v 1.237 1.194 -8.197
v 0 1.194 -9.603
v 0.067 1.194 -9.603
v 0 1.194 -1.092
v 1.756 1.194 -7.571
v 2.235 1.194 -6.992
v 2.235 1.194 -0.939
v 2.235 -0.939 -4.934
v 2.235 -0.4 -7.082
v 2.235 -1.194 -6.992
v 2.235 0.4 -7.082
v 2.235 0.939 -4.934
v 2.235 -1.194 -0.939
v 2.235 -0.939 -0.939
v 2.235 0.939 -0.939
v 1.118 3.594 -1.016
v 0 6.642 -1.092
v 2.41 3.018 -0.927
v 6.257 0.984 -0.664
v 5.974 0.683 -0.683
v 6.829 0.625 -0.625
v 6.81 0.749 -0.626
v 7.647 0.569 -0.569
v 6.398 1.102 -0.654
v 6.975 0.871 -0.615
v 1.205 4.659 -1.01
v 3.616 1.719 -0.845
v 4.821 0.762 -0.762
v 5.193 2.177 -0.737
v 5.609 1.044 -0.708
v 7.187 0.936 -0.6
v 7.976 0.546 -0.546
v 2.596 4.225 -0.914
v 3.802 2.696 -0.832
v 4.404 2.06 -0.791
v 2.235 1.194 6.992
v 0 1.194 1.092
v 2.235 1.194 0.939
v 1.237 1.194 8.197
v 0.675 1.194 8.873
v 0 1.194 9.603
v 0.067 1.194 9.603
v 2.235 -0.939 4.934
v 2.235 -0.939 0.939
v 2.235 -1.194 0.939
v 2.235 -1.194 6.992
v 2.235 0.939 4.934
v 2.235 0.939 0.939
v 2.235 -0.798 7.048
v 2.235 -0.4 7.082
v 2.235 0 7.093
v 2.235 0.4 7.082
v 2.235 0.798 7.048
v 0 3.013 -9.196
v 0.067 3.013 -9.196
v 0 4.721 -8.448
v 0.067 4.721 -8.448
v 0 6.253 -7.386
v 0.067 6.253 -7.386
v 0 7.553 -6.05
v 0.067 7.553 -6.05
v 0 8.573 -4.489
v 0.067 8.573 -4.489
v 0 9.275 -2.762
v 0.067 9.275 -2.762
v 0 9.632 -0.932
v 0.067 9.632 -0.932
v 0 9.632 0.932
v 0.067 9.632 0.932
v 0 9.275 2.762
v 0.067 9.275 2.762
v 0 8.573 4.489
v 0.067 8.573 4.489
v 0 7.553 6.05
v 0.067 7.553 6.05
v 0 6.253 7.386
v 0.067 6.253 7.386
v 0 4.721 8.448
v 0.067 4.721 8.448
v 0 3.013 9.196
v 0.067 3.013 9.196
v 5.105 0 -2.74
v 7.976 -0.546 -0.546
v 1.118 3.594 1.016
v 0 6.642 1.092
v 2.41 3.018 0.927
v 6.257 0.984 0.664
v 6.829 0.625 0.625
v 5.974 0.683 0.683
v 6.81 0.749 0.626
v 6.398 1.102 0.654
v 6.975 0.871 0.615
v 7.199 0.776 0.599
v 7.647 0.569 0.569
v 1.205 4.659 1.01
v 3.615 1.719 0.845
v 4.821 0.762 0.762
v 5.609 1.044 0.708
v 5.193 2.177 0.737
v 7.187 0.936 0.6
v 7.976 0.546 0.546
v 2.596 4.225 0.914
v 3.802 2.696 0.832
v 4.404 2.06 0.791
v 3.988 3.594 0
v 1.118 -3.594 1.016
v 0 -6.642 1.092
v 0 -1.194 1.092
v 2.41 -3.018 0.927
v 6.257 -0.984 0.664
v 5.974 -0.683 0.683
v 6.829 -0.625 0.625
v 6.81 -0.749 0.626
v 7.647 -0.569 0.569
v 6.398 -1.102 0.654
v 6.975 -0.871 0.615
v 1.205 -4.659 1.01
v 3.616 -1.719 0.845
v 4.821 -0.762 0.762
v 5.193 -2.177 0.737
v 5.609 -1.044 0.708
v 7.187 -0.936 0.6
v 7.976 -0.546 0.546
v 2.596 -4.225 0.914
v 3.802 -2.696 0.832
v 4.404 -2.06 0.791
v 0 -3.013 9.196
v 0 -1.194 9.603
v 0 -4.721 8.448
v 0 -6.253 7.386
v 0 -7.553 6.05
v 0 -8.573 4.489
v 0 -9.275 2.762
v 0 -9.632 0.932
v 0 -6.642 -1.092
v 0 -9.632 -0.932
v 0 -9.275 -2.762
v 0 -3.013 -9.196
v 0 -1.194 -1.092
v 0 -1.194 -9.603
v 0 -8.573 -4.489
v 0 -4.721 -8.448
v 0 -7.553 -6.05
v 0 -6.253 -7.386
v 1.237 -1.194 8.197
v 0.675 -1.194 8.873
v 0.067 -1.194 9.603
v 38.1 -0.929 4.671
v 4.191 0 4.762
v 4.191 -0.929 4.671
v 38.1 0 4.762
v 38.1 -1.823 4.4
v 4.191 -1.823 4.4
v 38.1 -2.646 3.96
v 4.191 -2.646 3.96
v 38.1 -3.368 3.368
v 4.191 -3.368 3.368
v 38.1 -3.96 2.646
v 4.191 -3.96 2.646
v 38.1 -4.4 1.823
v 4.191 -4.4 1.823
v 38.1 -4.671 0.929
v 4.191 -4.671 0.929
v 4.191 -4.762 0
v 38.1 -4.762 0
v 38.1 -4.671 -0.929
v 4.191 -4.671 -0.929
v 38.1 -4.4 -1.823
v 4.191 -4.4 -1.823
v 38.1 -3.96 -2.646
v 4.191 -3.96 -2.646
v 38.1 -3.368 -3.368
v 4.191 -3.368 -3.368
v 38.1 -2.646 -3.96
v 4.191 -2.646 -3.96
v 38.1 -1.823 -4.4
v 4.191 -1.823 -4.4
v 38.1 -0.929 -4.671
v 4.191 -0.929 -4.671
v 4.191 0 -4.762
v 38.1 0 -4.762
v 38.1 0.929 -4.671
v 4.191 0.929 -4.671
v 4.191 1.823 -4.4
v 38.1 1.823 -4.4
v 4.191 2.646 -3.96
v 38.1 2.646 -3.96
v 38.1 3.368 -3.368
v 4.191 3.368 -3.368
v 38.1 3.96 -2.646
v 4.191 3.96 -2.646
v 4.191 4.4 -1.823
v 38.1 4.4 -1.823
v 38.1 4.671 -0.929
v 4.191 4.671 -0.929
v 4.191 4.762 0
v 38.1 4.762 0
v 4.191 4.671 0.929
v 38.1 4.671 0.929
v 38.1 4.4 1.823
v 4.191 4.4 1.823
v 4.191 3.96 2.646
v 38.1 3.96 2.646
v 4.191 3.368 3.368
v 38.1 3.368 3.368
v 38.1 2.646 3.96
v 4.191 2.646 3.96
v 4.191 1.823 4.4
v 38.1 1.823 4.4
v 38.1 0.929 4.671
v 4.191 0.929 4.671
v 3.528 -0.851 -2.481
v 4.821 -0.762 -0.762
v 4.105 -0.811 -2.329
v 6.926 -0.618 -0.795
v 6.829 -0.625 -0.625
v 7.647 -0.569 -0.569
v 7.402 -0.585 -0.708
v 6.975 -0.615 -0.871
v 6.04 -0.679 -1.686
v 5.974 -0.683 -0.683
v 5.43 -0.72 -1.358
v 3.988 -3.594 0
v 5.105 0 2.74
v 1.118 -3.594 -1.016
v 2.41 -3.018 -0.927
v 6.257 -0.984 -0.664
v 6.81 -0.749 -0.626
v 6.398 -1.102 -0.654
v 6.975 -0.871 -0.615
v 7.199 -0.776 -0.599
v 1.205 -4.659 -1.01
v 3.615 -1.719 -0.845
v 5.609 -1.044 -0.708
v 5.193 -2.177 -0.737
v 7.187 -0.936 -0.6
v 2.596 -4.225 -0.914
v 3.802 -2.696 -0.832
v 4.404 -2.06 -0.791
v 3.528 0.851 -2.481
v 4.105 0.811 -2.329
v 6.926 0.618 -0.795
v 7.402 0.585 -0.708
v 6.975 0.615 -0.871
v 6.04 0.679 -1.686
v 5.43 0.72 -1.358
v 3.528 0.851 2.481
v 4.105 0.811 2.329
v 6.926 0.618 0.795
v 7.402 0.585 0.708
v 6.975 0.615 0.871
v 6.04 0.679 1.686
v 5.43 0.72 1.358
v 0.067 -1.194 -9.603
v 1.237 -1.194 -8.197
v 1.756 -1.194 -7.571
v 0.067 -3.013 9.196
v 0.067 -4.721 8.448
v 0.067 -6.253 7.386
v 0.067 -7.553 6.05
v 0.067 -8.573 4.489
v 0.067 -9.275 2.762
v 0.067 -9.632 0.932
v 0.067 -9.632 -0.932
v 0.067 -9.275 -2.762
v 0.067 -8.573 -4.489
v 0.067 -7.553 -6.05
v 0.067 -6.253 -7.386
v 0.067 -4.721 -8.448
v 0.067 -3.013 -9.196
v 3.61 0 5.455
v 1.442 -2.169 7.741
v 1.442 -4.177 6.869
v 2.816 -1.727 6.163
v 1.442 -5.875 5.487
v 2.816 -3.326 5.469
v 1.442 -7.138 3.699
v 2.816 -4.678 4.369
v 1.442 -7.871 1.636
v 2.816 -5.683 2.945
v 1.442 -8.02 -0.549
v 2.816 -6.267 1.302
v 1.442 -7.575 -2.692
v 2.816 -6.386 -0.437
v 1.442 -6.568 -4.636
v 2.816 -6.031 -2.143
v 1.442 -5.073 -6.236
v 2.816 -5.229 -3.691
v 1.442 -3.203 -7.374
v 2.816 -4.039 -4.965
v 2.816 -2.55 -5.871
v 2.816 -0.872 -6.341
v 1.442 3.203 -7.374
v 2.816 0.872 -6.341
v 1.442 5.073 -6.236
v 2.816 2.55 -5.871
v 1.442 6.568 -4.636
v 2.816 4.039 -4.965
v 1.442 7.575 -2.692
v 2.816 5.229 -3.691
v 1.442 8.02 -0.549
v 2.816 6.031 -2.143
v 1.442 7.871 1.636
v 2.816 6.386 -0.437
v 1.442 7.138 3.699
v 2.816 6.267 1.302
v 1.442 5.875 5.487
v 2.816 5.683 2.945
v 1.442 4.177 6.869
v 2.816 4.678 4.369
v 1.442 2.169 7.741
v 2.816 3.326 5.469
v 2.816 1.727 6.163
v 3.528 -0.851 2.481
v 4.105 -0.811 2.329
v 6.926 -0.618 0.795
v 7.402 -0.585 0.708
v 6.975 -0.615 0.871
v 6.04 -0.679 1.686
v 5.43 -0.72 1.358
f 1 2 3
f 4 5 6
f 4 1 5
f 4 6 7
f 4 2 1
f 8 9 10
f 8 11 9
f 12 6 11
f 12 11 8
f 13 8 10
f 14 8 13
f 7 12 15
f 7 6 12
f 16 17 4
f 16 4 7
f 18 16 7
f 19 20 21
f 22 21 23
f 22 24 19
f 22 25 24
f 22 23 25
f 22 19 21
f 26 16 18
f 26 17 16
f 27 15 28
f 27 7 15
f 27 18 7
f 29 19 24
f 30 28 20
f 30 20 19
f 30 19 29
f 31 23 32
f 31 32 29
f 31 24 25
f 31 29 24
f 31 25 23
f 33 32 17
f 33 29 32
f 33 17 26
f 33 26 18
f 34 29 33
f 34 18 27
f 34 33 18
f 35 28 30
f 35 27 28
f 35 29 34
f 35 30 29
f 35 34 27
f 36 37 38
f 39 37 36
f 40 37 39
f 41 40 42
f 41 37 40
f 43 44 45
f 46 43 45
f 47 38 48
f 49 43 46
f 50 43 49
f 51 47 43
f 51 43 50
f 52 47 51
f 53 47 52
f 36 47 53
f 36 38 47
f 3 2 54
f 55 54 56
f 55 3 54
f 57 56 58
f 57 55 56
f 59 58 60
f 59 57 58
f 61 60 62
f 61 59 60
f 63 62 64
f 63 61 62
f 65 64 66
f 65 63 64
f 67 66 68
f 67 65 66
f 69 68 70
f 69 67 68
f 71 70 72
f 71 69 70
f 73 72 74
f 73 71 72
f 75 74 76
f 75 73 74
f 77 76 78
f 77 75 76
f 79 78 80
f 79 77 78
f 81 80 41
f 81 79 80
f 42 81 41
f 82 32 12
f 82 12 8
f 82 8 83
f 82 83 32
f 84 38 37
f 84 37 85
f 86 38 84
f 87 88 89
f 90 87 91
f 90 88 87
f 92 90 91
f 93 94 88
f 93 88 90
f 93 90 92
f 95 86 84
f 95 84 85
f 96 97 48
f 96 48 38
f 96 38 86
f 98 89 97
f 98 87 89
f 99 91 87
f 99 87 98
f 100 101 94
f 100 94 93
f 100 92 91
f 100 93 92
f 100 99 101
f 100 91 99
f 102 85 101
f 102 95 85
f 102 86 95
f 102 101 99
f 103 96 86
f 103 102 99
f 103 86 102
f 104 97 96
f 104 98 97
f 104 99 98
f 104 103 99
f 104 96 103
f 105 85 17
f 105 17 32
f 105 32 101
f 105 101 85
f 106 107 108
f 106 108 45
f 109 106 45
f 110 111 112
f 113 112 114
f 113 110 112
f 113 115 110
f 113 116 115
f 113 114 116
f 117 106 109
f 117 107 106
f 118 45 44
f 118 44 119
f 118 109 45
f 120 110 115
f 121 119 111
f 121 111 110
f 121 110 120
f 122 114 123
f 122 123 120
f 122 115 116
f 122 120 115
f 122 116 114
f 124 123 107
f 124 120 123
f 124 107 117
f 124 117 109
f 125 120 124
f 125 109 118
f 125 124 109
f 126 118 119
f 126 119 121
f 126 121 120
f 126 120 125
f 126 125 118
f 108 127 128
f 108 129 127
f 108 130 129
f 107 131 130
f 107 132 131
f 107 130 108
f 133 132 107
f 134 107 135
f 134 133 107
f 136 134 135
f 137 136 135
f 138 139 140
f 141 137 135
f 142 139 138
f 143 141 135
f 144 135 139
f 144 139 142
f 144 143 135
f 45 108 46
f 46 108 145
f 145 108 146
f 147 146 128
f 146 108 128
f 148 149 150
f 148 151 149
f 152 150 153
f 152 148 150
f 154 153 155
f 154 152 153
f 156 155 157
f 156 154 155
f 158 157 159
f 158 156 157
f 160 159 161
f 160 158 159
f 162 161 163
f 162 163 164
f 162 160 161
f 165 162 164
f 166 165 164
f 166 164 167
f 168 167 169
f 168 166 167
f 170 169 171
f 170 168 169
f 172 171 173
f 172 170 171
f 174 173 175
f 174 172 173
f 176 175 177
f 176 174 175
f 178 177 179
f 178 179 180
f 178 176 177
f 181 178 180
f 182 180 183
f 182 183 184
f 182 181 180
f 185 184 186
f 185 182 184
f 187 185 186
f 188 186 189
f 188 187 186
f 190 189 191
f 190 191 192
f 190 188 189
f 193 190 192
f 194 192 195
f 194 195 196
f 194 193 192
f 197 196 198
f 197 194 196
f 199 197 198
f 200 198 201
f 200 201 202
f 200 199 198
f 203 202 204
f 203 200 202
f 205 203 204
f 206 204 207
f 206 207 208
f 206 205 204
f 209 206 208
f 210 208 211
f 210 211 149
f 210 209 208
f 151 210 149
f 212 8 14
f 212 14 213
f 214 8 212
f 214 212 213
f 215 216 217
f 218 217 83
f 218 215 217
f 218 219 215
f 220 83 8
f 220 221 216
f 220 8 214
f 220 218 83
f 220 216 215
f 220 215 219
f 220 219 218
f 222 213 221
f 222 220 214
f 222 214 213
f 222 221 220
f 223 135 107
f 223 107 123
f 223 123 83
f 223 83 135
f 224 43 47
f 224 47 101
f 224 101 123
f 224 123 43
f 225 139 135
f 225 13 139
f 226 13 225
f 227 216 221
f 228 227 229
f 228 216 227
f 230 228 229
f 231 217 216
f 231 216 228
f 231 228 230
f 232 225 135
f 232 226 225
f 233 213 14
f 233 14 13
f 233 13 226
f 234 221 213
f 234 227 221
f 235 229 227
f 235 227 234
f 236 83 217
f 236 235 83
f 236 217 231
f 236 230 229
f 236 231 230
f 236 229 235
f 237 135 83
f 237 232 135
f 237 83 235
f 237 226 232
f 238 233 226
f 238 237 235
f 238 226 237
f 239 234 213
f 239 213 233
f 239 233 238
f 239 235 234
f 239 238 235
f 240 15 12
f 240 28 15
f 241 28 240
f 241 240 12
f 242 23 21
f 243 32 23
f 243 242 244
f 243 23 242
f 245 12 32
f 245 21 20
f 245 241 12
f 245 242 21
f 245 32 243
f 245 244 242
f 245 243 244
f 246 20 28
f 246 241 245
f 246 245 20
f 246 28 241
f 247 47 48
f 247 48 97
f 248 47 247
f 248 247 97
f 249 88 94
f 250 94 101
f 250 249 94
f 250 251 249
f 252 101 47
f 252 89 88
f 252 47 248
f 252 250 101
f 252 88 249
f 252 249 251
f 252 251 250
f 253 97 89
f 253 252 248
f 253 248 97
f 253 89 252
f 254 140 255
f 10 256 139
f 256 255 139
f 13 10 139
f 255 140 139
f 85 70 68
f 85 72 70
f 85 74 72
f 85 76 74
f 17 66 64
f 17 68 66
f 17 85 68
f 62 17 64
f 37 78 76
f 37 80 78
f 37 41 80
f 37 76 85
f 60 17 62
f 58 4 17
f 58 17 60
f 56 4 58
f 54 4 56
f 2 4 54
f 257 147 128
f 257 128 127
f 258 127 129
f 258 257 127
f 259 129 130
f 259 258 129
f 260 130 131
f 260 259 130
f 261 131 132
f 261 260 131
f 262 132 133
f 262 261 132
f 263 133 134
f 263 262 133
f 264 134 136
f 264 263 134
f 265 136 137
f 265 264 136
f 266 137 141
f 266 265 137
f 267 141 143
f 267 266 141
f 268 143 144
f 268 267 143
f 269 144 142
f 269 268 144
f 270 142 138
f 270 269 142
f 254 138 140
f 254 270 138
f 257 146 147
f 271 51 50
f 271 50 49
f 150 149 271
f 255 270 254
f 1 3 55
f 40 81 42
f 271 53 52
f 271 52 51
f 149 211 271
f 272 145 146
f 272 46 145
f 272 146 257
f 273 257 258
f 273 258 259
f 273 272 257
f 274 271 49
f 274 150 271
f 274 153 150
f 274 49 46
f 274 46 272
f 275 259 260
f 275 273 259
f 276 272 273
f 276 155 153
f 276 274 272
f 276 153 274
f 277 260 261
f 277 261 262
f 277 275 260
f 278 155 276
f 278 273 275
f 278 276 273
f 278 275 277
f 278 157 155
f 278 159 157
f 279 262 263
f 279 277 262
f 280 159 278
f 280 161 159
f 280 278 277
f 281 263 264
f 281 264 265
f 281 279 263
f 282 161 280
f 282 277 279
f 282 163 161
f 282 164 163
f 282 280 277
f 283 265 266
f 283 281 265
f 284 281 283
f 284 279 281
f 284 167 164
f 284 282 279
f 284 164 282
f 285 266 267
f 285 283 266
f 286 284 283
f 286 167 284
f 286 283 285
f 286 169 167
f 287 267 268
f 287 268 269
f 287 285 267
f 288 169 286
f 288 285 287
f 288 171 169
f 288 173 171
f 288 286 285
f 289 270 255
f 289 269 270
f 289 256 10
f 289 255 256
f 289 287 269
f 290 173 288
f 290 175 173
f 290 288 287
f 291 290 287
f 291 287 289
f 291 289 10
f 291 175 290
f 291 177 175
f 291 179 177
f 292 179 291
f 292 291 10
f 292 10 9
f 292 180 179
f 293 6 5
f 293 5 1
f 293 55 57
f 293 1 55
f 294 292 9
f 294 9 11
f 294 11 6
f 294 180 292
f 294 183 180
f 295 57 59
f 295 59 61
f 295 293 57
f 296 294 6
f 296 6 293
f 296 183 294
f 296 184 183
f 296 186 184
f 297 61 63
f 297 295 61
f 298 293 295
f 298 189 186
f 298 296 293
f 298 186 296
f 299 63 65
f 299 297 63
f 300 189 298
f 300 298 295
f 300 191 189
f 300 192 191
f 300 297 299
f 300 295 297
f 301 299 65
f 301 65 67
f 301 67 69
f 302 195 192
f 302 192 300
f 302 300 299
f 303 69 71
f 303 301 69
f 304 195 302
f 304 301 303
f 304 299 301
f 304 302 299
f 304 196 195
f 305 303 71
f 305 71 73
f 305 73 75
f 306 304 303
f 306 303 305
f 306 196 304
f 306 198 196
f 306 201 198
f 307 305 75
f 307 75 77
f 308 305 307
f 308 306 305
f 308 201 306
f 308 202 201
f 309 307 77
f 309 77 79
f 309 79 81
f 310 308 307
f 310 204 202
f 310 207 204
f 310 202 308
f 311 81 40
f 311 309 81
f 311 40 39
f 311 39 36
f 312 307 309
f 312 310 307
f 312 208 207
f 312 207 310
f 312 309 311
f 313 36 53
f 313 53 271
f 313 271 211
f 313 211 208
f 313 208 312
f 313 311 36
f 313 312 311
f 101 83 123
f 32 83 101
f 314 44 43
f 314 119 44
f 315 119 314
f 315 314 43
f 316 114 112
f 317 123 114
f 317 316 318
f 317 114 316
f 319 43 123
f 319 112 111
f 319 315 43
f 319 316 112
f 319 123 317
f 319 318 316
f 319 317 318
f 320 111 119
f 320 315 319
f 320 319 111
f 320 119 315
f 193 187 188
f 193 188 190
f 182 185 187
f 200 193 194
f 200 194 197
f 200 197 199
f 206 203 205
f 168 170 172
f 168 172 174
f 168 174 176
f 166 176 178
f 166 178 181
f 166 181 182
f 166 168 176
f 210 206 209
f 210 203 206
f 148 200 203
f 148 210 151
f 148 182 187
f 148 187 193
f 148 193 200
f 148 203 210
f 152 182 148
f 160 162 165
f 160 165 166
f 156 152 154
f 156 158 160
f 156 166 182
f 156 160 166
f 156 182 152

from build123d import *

# Parameters (mm, degrees)
SKETCH2_W         = 19.3548
SKETCH2_H         = 2.3876
SLOT_DEPTH        = 2.2352
SKETCH3_W         = 2.1844
SKETCH3_H         = 13.2842
SKETCH4_W         = 1.0922
SKETCH4_H         = 1.0922
CIRPATTERN1_COUNT = 2
CIRPATTERN1_ANGLE = 90


with BuildPart() as part:
    # BodySke → Base-Revolve (revolve)
    with BuildSketch(Plane.XY, mode=Mode.PRIVATE) as base_revolve_sk:
        Polygon((0, 0), (0, 9.6774), (0.066909223, 9.6774), (4.191, 4.7625), (38.1, 4.7625), (38.1, 0), align=None)
    revolve(base_revolve_sk.sketch.rotate(Axis((-6.35, 0, 0), (1, 0, 0)), 90), axis=Axis((-6.35, 0, 0), (1, 0, 0)))  # turned: the seam where the file's is

    # Sketch2 → Slot (cut)
    with BuildSketch(Plane.ZY):
        Rectangle(SKETCH2_W, SKETCH2_H)
    extrude(amount=-SLOT_DEPTH, mode=Mode.SUBTRACT)

    # Sketch3 → Cross section 0
    with BuildSketch(Plane.ZY):
        Rectangle(SKETCH3_W, SKETCH3_H)
    # Sketch4 → Cross section 1
    with BuildSketch(Plane.ZY.offset(-7.9756)):
        Rectangle(SKETCH4_W, SKETCH4_H)
    cross = loft(mode=Mode.SUBTRACT)

    # CirPattern1: Cross ×2 about axis
    cirpattern1_axis = Axis((0, 0, 0), (1, 0, 0))
    for i in range(1, CIRPATTERN1_COUNT):
        add(cross.rotate(cirpattern1_axis, i * CIRPATTERN1_ANGLE / (CIRPATTERN1_COUNT - 1)), mode=Mode.SUBTRACT)


solid = part.part
